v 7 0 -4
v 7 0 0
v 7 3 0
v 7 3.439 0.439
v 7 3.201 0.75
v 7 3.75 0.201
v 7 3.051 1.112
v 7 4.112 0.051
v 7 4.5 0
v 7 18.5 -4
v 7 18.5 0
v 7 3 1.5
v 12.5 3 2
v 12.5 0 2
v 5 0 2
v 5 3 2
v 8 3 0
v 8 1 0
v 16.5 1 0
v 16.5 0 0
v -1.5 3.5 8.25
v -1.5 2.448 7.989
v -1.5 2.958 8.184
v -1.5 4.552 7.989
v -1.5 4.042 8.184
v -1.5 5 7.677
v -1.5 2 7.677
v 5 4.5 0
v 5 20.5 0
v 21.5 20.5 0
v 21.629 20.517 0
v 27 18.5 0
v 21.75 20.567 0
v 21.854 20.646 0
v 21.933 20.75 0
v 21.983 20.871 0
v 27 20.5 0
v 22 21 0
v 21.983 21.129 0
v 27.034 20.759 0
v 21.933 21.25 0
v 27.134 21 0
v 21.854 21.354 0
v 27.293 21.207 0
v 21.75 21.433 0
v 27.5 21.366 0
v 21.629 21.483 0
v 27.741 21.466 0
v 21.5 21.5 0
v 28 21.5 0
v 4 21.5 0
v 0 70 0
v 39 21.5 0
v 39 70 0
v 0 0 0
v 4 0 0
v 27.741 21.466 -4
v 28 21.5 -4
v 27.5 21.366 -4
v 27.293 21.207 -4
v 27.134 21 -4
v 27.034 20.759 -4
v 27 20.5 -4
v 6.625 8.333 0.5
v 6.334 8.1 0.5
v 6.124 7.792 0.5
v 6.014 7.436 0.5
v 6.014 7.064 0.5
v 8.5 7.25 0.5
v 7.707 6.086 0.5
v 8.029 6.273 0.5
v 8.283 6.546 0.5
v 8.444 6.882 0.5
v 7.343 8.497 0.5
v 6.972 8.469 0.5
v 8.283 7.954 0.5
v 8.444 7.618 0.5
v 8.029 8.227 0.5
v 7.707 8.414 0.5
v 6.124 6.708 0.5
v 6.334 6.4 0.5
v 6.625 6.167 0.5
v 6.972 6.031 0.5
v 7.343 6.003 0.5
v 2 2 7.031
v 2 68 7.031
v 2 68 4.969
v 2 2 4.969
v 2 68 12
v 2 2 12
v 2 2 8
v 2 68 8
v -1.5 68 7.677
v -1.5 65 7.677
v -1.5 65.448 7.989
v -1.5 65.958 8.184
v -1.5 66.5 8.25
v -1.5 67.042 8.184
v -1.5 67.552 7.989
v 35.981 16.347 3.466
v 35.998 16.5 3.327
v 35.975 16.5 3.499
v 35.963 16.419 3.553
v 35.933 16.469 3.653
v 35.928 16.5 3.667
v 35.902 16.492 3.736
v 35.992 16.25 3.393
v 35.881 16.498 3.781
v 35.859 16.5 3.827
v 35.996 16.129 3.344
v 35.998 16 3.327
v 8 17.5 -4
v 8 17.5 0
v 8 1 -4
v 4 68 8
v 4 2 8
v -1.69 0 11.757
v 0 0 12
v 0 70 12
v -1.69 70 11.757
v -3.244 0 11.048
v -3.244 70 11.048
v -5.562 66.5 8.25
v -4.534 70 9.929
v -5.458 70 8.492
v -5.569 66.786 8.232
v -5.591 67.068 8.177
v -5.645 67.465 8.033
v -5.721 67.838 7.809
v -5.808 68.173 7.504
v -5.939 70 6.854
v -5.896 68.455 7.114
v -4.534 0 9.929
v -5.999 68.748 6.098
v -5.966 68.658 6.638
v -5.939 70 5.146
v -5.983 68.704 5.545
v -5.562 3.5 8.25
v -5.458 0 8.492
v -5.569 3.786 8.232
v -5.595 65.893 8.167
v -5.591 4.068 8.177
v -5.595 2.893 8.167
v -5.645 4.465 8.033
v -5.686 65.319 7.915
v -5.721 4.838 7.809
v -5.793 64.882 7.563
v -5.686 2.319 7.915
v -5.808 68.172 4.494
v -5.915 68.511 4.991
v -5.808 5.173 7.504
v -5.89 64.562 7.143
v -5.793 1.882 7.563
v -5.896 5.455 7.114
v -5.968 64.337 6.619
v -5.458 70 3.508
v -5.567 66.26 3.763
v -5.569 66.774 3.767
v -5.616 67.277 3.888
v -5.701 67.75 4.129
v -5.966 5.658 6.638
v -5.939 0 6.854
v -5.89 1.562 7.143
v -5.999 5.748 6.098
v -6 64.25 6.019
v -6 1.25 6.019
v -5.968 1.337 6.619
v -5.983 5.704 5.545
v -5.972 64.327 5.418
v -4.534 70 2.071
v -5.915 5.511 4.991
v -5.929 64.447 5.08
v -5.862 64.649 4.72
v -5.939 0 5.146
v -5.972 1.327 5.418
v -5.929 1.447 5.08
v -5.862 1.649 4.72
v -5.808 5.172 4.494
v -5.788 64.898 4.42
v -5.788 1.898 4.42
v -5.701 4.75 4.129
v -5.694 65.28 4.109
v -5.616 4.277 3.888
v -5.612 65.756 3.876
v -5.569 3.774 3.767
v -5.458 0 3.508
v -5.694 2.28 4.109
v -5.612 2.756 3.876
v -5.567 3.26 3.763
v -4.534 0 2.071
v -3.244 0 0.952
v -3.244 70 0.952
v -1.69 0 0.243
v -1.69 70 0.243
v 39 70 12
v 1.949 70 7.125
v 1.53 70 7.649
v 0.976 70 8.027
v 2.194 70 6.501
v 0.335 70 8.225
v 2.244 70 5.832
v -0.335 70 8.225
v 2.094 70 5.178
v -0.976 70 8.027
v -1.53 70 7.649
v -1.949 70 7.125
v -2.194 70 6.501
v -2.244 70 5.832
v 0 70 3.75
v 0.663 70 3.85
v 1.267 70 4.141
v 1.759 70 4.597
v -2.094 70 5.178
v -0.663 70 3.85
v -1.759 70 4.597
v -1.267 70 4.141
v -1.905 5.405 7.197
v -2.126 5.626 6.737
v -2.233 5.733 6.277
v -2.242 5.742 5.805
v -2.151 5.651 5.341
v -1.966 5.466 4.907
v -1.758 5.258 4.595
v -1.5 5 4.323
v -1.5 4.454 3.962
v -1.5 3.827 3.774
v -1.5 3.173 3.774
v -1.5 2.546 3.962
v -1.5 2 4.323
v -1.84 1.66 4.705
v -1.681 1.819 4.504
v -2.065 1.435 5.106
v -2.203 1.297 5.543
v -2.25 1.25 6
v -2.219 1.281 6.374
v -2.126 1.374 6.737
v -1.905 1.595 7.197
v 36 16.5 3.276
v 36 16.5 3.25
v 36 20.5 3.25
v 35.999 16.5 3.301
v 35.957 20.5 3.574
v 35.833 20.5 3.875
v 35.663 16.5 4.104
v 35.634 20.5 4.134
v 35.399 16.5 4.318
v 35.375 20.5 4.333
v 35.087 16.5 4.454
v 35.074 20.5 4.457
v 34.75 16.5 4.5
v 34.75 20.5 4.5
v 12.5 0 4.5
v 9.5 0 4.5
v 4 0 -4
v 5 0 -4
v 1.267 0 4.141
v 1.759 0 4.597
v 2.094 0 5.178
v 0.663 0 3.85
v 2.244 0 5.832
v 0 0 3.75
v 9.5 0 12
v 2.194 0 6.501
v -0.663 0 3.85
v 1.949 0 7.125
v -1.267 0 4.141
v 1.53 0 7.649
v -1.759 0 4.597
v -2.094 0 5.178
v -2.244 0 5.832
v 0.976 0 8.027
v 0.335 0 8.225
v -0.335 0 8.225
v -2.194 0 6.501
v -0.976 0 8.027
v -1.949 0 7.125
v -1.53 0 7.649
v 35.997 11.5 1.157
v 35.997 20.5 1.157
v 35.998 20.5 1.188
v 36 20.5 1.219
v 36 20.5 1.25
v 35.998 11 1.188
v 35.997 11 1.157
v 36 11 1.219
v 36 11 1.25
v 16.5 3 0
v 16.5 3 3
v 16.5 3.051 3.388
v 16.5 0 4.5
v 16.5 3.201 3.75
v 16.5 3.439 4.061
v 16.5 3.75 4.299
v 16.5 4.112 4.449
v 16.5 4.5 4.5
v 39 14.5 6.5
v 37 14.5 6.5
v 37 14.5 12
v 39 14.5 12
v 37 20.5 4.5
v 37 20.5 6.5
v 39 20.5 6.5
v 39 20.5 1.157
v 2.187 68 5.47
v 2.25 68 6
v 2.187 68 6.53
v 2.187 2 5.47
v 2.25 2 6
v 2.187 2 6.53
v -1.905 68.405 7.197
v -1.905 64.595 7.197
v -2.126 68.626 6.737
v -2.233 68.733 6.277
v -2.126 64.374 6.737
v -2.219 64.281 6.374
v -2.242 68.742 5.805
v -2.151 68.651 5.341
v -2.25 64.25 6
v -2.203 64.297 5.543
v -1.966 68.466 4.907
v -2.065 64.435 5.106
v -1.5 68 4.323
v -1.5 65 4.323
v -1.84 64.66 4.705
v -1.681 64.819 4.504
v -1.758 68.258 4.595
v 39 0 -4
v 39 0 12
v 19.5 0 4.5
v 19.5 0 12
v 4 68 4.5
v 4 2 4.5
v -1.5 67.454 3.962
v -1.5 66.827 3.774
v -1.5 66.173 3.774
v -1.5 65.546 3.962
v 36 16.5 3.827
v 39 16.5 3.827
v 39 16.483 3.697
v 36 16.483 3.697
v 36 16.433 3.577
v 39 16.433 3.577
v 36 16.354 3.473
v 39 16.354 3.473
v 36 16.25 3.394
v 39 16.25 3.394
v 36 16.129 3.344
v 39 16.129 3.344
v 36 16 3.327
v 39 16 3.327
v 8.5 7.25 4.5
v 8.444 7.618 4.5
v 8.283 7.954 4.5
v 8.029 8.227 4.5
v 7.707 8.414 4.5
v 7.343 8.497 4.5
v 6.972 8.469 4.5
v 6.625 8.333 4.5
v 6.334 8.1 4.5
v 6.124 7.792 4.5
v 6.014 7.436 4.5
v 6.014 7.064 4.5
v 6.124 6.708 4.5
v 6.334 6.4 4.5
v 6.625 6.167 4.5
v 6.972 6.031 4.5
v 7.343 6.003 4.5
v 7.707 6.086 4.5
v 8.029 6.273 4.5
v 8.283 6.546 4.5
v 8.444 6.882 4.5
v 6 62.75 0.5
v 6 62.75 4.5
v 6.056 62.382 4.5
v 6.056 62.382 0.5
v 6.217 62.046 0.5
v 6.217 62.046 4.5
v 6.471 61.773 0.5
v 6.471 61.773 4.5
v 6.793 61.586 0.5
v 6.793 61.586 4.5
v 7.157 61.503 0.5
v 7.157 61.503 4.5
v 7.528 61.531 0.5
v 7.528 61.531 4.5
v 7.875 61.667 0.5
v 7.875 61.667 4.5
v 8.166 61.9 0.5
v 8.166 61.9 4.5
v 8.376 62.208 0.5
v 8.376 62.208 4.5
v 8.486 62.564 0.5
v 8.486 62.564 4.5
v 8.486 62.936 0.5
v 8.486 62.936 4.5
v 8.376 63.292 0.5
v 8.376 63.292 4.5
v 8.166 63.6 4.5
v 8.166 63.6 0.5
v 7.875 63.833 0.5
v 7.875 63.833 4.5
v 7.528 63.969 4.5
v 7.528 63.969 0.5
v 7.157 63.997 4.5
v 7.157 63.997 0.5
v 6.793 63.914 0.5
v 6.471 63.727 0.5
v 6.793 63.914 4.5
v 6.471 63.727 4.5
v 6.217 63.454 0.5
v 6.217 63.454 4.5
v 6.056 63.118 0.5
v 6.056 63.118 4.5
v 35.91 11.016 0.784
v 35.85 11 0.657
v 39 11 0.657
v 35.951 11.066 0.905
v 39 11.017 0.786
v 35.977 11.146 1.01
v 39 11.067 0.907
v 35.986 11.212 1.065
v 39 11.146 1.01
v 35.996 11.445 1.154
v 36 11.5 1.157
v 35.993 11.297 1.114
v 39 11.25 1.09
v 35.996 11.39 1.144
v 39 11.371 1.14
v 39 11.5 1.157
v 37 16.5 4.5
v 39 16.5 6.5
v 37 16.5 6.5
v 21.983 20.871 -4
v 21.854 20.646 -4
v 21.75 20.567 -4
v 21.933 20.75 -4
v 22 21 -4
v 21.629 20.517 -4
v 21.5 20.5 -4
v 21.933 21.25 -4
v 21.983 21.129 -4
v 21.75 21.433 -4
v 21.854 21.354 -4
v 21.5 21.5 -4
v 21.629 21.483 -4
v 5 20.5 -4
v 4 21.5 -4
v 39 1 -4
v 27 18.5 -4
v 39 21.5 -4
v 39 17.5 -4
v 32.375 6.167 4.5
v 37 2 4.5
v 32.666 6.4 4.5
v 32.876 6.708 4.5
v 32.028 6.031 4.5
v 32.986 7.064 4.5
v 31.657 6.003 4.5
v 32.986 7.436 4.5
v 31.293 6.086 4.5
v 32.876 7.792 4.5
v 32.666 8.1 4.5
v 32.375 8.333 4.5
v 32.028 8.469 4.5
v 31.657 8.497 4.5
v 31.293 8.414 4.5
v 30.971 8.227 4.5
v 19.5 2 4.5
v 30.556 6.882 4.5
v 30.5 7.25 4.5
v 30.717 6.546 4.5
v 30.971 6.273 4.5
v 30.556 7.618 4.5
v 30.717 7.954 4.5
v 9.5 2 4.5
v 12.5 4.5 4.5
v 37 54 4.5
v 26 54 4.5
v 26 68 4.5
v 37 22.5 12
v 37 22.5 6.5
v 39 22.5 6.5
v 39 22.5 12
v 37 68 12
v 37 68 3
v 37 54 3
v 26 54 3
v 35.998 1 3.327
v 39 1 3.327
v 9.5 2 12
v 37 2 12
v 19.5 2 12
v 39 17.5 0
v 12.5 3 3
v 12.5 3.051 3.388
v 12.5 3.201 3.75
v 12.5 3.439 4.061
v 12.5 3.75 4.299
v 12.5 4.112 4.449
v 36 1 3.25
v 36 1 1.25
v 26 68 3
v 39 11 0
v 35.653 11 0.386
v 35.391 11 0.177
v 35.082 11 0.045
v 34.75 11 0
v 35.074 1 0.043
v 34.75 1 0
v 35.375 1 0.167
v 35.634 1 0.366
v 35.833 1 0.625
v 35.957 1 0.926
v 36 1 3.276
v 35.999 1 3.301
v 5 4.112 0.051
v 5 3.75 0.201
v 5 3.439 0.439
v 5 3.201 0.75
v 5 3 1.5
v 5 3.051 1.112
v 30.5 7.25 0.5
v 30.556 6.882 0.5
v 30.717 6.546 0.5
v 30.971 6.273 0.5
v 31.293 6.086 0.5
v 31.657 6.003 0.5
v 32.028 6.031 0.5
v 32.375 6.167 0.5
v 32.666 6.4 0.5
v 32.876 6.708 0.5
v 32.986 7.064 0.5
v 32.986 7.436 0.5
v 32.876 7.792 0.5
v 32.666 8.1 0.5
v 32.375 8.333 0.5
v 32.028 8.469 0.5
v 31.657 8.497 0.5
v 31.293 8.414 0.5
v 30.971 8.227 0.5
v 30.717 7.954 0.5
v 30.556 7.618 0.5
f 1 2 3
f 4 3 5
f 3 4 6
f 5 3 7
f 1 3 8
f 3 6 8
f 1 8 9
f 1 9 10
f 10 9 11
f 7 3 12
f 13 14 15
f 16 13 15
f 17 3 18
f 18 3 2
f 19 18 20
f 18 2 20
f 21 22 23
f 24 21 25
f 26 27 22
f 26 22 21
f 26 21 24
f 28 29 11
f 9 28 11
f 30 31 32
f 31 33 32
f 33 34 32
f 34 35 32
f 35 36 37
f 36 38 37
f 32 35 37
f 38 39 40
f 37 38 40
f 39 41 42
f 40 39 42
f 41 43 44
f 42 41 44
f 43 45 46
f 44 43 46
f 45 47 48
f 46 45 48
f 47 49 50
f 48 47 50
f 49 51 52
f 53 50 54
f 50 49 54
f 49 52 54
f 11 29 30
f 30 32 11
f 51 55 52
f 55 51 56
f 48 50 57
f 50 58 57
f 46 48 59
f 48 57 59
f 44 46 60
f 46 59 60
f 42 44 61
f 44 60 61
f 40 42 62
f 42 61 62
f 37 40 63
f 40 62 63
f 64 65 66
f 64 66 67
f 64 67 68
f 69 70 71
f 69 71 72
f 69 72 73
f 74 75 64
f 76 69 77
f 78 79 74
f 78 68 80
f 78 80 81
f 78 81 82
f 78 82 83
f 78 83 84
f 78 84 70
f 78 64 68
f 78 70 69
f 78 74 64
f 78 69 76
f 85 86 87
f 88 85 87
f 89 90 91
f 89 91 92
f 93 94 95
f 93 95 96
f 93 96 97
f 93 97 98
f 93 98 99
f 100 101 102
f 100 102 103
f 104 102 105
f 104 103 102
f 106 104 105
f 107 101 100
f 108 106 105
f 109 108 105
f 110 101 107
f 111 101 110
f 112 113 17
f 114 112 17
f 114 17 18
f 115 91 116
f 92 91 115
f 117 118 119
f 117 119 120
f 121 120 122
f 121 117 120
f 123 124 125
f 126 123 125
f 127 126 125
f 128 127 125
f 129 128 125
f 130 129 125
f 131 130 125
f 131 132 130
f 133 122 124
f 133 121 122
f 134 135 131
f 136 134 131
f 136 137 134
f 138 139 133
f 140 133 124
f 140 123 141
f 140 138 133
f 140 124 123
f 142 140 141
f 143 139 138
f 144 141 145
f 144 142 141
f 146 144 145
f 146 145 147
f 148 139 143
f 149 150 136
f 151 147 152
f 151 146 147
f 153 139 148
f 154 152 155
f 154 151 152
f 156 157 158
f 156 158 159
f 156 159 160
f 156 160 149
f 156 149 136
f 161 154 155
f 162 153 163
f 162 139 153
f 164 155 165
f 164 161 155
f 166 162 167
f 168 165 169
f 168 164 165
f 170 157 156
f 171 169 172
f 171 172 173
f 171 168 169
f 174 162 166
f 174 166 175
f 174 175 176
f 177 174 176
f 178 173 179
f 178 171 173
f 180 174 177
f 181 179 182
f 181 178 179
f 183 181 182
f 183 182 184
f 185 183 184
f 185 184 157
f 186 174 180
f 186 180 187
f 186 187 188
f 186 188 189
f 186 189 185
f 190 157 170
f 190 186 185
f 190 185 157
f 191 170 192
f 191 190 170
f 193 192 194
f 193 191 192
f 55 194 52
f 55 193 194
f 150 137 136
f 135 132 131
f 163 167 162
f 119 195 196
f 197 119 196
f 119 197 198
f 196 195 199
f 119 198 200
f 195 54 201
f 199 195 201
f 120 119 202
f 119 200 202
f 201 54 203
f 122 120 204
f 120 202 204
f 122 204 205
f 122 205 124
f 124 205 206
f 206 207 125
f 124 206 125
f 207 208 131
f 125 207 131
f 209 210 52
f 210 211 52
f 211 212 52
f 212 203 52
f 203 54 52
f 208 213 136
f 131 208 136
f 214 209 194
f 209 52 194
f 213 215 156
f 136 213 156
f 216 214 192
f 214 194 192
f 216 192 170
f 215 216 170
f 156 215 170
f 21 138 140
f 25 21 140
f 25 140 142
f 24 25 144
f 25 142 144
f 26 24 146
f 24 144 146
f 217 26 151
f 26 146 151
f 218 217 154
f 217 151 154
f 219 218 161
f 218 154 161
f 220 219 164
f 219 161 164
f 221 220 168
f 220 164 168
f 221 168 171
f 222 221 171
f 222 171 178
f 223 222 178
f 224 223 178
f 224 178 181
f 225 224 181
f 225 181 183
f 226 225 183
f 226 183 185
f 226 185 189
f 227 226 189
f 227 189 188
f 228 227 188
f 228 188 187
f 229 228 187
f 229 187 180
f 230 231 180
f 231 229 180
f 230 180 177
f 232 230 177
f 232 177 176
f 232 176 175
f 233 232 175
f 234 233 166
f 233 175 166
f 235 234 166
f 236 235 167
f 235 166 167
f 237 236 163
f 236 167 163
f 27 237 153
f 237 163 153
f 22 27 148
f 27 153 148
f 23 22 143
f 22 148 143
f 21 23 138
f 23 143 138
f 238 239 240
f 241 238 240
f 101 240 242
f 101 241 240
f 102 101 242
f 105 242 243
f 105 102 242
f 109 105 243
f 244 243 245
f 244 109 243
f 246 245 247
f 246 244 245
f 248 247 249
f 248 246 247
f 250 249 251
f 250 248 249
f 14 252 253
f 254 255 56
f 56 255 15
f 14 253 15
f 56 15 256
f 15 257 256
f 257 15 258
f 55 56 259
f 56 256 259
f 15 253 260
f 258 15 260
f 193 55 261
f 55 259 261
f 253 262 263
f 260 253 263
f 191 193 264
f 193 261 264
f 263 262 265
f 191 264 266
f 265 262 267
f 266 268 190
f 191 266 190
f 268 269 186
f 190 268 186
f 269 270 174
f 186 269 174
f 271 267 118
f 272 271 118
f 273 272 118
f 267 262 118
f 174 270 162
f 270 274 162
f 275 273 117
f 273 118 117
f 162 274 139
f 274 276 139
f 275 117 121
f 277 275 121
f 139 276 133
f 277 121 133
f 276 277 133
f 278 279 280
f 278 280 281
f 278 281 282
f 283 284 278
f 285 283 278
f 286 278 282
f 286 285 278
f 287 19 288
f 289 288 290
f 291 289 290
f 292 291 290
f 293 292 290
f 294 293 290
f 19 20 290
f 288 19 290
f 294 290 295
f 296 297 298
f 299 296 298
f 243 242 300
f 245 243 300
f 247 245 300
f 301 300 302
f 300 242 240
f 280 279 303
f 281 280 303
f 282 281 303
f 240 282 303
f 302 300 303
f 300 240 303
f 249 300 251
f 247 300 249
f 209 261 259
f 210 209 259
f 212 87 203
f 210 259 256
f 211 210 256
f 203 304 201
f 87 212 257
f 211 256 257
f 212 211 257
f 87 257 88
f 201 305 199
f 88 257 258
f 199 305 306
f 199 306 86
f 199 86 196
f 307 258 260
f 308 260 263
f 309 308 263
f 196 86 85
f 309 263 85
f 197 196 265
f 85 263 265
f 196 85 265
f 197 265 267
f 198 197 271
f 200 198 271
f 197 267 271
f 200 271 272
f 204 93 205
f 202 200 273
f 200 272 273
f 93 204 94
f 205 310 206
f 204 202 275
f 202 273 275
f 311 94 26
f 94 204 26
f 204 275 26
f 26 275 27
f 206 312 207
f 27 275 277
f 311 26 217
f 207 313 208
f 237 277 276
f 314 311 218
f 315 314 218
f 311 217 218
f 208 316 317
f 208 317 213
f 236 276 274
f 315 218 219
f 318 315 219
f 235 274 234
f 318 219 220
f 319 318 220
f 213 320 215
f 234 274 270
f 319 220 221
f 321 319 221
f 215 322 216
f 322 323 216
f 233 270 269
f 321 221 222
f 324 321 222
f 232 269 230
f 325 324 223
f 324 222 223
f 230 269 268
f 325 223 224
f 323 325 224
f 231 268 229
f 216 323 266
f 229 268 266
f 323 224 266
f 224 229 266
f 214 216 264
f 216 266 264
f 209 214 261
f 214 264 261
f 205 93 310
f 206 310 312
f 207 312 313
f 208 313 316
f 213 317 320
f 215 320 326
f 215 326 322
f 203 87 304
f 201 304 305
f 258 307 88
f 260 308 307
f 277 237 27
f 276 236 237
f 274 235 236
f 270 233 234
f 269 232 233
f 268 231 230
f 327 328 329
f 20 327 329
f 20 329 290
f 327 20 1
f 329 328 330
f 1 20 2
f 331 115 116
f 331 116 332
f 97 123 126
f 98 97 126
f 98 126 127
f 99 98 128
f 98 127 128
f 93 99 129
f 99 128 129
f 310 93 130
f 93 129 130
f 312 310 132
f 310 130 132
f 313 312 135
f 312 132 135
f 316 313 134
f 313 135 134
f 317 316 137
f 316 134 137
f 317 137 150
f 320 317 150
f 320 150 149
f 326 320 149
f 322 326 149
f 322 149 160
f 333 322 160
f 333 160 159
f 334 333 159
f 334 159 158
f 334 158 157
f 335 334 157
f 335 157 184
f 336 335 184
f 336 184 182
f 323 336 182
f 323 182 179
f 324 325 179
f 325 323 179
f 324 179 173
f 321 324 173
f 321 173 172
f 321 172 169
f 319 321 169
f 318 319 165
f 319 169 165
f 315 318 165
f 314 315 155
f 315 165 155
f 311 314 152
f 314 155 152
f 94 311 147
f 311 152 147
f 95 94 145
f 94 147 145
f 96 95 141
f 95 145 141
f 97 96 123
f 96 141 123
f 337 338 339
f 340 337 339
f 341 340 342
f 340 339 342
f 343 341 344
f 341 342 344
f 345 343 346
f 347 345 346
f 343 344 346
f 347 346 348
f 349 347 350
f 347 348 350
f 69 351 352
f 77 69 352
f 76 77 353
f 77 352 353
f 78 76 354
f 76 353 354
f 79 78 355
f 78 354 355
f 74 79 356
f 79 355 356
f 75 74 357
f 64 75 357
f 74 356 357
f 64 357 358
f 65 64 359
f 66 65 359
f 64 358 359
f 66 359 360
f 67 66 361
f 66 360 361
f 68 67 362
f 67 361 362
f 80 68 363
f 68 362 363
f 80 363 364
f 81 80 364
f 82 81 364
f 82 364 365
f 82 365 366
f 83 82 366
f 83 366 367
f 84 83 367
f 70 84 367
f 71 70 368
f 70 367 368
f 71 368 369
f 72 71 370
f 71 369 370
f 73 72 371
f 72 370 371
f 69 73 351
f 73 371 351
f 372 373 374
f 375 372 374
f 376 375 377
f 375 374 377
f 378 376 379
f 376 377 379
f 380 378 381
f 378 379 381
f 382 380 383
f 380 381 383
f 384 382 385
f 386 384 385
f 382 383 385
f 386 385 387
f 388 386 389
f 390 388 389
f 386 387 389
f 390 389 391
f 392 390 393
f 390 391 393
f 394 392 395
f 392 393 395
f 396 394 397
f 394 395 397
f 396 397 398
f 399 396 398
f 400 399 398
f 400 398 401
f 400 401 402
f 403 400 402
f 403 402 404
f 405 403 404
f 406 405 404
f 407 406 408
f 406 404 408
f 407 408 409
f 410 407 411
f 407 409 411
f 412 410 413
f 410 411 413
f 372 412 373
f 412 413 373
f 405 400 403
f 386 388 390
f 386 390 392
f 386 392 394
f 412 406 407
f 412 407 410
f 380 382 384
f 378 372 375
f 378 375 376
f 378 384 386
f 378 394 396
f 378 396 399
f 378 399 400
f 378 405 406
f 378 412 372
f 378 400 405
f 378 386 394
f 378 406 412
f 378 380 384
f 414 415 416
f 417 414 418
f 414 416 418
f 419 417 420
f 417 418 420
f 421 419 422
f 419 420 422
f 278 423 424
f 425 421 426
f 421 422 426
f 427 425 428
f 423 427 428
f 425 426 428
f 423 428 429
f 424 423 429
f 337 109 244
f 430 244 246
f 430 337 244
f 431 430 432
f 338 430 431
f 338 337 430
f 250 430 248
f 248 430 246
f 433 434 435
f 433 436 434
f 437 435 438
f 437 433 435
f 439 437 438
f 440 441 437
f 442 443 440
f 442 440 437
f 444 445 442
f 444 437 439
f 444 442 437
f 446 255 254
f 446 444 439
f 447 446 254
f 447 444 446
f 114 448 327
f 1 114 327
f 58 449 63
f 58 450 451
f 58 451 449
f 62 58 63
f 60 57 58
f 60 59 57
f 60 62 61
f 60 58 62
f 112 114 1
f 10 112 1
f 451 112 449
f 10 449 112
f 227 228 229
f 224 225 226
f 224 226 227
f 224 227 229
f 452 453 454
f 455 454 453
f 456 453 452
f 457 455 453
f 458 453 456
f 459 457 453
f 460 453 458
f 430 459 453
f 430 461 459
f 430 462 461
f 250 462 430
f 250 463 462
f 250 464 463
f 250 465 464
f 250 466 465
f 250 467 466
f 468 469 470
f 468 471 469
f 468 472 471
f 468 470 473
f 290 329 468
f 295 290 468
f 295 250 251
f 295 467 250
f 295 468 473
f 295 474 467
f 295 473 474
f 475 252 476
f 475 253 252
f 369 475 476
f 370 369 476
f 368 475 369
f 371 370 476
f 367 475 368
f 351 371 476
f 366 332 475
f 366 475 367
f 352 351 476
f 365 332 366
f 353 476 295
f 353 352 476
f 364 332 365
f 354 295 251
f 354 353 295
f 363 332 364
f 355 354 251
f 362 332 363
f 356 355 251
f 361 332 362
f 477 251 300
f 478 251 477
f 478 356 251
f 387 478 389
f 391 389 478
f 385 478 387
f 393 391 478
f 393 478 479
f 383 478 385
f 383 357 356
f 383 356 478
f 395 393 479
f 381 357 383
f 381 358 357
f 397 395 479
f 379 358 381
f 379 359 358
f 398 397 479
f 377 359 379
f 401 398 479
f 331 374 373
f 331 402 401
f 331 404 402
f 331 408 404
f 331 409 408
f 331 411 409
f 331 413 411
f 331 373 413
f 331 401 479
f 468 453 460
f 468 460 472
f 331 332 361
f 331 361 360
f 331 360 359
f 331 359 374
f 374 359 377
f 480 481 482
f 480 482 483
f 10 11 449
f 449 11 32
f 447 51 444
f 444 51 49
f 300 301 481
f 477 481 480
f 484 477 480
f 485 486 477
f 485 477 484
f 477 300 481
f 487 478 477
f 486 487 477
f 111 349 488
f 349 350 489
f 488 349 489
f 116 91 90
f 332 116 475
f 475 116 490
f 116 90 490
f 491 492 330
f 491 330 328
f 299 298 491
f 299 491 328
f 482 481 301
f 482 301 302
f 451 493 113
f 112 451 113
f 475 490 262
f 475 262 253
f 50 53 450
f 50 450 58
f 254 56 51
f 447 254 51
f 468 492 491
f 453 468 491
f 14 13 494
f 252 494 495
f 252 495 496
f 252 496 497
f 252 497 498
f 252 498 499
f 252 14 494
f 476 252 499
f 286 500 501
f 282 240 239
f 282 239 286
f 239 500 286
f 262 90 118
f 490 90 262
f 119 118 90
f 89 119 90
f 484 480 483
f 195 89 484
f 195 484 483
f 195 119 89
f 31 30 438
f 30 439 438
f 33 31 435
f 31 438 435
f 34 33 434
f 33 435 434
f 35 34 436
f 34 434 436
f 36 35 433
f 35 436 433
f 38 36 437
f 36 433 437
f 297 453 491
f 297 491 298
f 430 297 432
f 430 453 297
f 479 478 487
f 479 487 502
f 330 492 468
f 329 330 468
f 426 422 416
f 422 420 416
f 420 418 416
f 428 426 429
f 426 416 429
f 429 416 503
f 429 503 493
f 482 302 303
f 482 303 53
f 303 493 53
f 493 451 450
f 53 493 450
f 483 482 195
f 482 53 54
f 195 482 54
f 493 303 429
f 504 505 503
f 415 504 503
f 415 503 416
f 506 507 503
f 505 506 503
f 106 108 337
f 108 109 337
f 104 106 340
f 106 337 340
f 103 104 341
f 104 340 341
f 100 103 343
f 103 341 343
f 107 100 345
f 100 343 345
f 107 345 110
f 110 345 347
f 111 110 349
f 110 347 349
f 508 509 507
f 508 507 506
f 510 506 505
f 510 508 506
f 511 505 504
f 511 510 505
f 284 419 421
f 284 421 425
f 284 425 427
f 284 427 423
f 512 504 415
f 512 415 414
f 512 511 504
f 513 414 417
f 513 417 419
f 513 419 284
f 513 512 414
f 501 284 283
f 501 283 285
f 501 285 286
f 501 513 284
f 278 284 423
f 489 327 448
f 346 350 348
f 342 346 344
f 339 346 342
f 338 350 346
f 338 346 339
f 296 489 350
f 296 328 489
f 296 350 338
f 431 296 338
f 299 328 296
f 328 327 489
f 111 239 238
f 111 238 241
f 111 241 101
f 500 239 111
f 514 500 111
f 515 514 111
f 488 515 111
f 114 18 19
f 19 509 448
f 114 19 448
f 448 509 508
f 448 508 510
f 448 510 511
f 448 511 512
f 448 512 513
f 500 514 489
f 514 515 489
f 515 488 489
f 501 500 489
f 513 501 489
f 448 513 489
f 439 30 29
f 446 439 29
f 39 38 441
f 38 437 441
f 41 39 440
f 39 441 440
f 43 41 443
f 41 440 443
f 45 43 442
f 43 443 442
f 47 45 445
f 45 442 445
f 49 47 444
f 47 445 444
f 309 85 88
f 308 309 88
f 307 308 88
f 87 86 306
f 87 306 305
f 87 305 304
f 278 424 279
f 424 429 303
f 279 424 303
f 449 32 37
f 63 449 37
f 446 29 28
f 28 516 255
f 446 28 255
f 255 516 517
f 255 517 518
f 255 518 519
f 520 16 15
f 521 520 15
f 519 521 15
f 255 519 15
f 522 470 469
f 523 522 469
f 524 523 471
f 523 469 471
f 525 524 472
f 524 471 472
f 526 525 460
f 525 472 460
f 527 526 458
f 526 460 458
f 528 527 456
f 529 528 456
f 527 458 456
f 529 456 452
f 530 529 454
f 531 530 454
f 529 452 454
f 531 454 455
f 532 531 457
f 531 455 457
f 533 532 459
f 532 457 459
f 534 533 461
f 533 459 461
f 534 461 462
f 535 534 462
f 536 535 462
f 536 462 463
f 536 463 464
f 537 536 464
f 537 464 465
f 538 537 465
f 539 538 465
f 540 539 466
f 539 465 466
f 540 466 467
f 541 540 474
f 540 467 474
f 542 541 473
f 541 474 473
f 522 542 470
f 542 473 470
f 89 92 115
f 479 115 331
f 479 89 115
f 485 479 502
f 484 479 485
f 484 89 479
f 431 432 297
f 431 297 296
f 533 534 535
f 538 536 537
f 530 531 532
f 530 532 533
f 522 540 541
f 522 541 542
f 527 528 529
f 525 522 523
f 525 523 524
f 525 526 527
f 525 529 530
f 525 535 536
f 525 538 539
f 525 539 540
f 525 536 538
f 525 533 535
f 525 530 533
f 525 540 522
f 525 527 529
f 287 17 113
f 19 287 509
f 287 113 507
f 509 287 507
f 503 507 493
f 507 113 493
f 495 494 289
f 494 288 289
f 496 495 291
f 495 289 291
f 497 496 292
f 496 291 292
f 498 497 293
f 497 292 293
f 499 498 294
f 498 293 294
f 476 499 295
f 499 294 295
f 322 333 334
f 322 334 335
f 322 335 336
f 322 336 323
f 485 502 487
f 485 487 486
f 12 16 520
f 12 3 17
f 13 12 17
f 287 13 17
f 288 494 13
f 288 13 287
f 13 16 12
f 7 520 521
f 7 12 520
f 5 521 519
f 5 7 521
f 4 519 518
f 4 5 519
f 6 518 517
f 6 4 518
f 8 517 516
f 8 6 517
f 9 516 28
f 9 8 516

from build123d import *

# Parameters (mm, degrees)
SKETCH1_W                = 39
SKETCH1_H                = 70
BASE_DEPTH               = 4.5
SKETCH2_W                = 4
SKETCH2_H                = 62
WALLS_DEPTH              = 7.5
SKETCH3_W                = 10
SKETCH3_H                = 7.5
PWR_CONNECTOR_HOLE_DEPTH = 4
SKETCH4_W                = 7.5
SKETCH4_H                = 8
GPS_CONNECTOR_HOLE_DEPTH = 4
SKETCH5_R                = 1.25
MOUNTING_HOLES_DEPTH     = 4
GPS_MOUNT_DEPTH          = 4
SKETCH11_W               = 17
SKETCH11_H               = 1
SKETCH11_W_2             = 12
SKETCH11_H_2             = 3
PWR_CABLE_HOLDER1_DEPTH  = 4
SKETCH12_W               = 4
SKETCH12_H               = 2.5
PWR_CABLE_HOLDER2_DEPTH  = 3
PWR_FILLET_R             = 1.5
PWR_FILLET2_R            = 1
PWR_FILLET3_R            = 0.5
GPS_CABLE_HOLDER_DEPTH   = 3
GPS_START                = 1
GPS_FILLET_DEPTH         = 10
GPS_START_2              = 16.5
GPS_FILLET_2_DEPTH       = 4
GPS_START_3              = 9.15727
GPS_FILLET_3_DEPTH       = 8.34273
GPS_FILLET_2_2_R         = 0.5
SKETCH15_R               = 6
BALLON_MOUNT_DEPTH       = 70
SKETCH16_R               = 2.25
BALLOON_MOUNT_HOLE_DEPTH = 70
SKETCH21_R               = 2.25
SAFETY_MOUNT_DEPTH       = 4.5
SKETCH22_W               = 35
SKETCH22_H               = 66
LID_HOLE_DEPTH           = 7.5
SKETCH25_W               = 3.5
SKETCH25_H               = 66
CORRECTION_DEPTH         = 2
SKETCH28_W               = 2
SKETCH28_H               = 2
SMALLER_WALLS_DEPTH      = 2
SKETCH29_W               = 11
SKETCH29_H               = 14
ANTENNA_SPACE_DEPTH      = 1.5


with BuildPart() as part:
    # Sketch1 → Base (new body)
    with BuildSketch(Plane.XY):
        with Locations((19.5, 35)):
            Rectangle(SKETCH1_W, SKETCH1_H)
    extrude(amount=BASE_DEPTH)

    # Sketch2 → Walls (add)
    with BuildSketch(Plane.XY.offset(4.5)):
        Polygon((39, 66), (39, 70), (0, 70), (0, 66), (4, 66), (35, 66), align=None)
        with Locations((37, 35)):
            Rectangle(SKETCH2_W, SKETCH2_H)
        Polygon((4, 66), (0, 66), (0, 0), (4, 0), (4, 4), align=None)
        Polygon((39, 0), (39, 4), (35, 4), (4, 4), (4, 0), align=None)
    extrude(amount=WALLS_DEPTH)

    # Sketch3 → PWR connector hole (cut)
    with BuildSketch(Plane(origin=(0, 4, 0), x_dir=(1, 0, 0), z_dir=(0, 1, 0))):
        with Locations((14.5, -8.25)):
            Rectangle(SKETCH3_W, SKETCH3_H)
    extrude(amount=-PWR_CONNECTOR_HOLE_DEPTH, mode=Mode.SUBTRACT)

    # Sketch4 → GPS connector hole (cut)
    with BuildSketch(Plane.ZY.offset(-35)):
        with Locations((8.25, 18.5)):
            Rectangle(SKETCH4_W, SKETCH4_H)
    extrude(amount=-GPS_CONNECTOR_HOLE_DEPTH, mode=Mode.SUBTRACT)

    # Sketch5 → Mounting holes (cut)
    with BuildSketch(Plane.XY.offset(4.5)):
        with Locations((7.25, 7.25)):
            Circle(SKETCH5_R)
        with Locations(Location((31.75, 7.25, 0), (0, 0, 180))):
            Circle(SKETCH5_R)
        with Locations(Location((7.25, 62.75, 0), (0, 0, 180))):
            Circle(SKETCH5_R)
    extrude(amount=-MOUNTING_HOLES_DEPTH, mode=Mode.SUBTRACT)

    # Sketch7 → GPS mount (add)
    with BuildSketch(Plane(origin=(0, 0, 0), x_dir=(-1, 0, 0), z_dir=(0, 0, -1))):
        Polygon((-39, 1), (-39, 0), (-7, 0), (-7, 18.5), (-39, 18.5), (-39, 17.5), (-8, 17.5), (-8, 1), align=None)
    extrude(amount=GPS_MOUNT_DEPTH)

    # Sketch11 → PWR cable holder1 (add)
    with BuildSketch(Plane(origin=(0, 0, 0), x_dir=(-1, 0, 0), z_dir=(0, 0, -1))):
        Polygon((-5, 0), (-4, 0), (-4, 21.5), (-5, 21.5), (-5, 20.5), align=None)
        with Locations((-13.5, 21)):
            Rectangle(SKETCH11_W, SKETCH11_H)
        with Locations((-33, 20)):
            Rectangle(SKETCH11_W_2, SKETCH11_H_2)
    extrude(amount=PWR_CABLE_HOLDER1_DEPTH)

    # Sketch12 → PWR cable holder2 (cut)
    with BuildSketch(Plane.XZ):
        Polygon((5, 2), (5, 0), (7, 0), (16.5, 0), (16.5, 2), (12.5, 2), align=None)
        with Locations((14.5, 3.25)):
            Rectangle(SKETCH12_W, SKETCH12_H)
    extrude(amount=-PWR_CABLE_HOLDER2_DEPTH, mode=Mode.SUBTRACT)

    # PWR fillet
    pwr_fillet_edges = [part.edges().sort_by_distance(p)[0] for p in [
        (6, 3, 0),
        (14.5, 3, 4.5),
    ]]
    fillet(pwr_fillet_edges, radius=PWR_FILLET_R)

    # PWR fillet2
    pwr_fillet2_edges = [part.edges().sort_by_distance(p)[0] for p in [
        (27, 21.5, -2),
    ]]
    fillet(pwr_fillet2_edges, radius=PWR_FILLET2_R)

    # PWR fillet3
    pwr_fillet3_edges = [part.edges().sort_by_distance(p)[0] for p in [
        (22, 21.5, -2),
        (22, 20.5, -2),
    ]]
    fillet(pwr_fillet3_edges, radius=PWR_FILLET3_R - 0.0001)  # a hair under: the kernel refuses the full size

    # Sketch13 → GPS cable holder (cut)
    with BuildSketch(Plane(origin=(39, 0, 0), x_dir=(0, 0, -1), z_dir=(1, 0, 0))):
        Polygon((-1.156586719, 11), (-2.326586719, 11), (-2.326586719, 1), (0, 1), (0, 11), align=None)
        Polygon((-2.326586719, 11), (-2.326586719, 16.5), (-3.326586719, 16.5), (-3.326586719, 1), (-2.326586719, 1), align=None)
        Polygon((-1.156586719, 20.5), (-2.326586719, 20.5), (-2.326586719, 16.5), (-2.326586719, 11), (-1.156586719, 11), align=None)
        Polygon((-2.326586719, 20.5), (-4.5, 20.5), (-4.5, 16.5), (-3.326586719, 16.5), (-2.326586719, 16.5), align=None)
    extrude(amount=-GPS_CABLE_HOLDER_DEPTH, mode=Mode.SUBTRACT)

    # GPS fillet: read off the stored shape, not the designer's step
    # GPS fillet outline → GPS fillet (cut)
    with BuildSketch(Plane(origin=(0, 0, 0), x_dir=(1, 0, 0), z_dir=(0, 1, 0)).offset(GPS_START)):
        with BuildLine():
            Line((36, -3.326586719), (36, -3.25))
            ThreePointArc((36, -3.25), (35.999412758, -3.288311358), (35.997651584, -3.326586719))
            Line((35.997651584, -3.326586719), (36, -3.326586719))
        make_face()
        with BuildLine():
            Line((36, -1.25), (36, 0))
            Line((36, 0), (34.75, 0))
            ThreePointArc((34.75, 0), (35.633883476, -0.366116524), (36, -1.25))
        make_face()
    extrude(amount=GPS_FILLET_DEPTH, mode=Mode.SUBTRACT)

    # GPS fillet 2 outline → GPS fillet 2 (cut)
    with BuildSketch(Plane(origin=(0, 0, 0), x_dir=(1, 0, 0), z_dir=(0, 1, 0)).offset(GPS_START_2)):
        with BuildLine():
            ThreePointArc((36, -3.25), (35.633883476, -4.133883476), (34.75, -4.5))
            Line((34.75, -4.5), (36, -4.5))
            Line((36, -4.5), (36, -3.25))
        make_face()
        with BuildLine():
            ThreePointArc((35.996504697, -1.156586719), (35.999125868, -1.203260674), (36, -1.25))
            Line((36, -1.25), (36, -1.156586719))
            Line((36, -1.156586719), (35.996504697, -1.156586719))
        make_face()
    extrude(amount=GPS_FILLET_2_DEPTH, mode=Mode.SUBTRACT)

    # GPS fillet 3 outline → GPS fillet 3 (cut)
    with BuildSketch(Plane(origin=(0, 0, 0), x_dir=(1, 0, 0), z_dir=(0, 1, 0)).offset(GPS_START_3)):
        with BuildLine():
            Line((36, -3.326586719), (36, -3.25))
            ThreePointArc((36, -3.25), (35.999412758, -3.288311358), (35.997651584, -3.326586719))
            Line((35.997651584, -3.326586719), (36, -3.326586719))
        make_face()
        with BuildLine():
            ThreePointArc((35.996504697, -1.156586719), (35.999125868, -1.203260674), (36, -1.25))
            Line((36, -1.25), (36, -1.156586719))
            Line((36, -1.156586719), (35.996504697, -1.156586719))
        make_face()
    extrude(amount=GPS_FILLET_3_DEPTH, mode=Mode.SUBTRACT)

    # GPS fillet 2 2
    # the kernel refuses this fillet: 0.5 mm, written as the material it takes off along each edge
    with BuildSketch(Plane(origin=(40.25, 11, 1.156586719), x_dir=(0, 0, -1), z_dir=(-1, 0, 0))) as gps_fillet_2_2_piece_1:
        with BuildLine():
            CenterArc((GPS_FILLET_2_2_R, -GPS_FILLET_2_2_R), GPS_FILLET_2_2_R, 90, 90)
            Line((0, -GPS_FILLET_2_2_R), (0, 0))
            Line((0, 0), (GPS_FILLET_2_2_R, 0))
        make_face()
    extrude(amount=4.25, mode=Mode.SUBTRACT)
    with BuildSketch(Plane(origin=(40.25, 16.5, 3.326586719), x_dir=(0, -1, 0), z_dir=(-1, 0, 0))) as gps_fillet_2_2_piece_2:
        with BuildLine():
            CenterArc((GPS_FILLET_2_2_R, GPS_FILLET_2_2_R), GPS_FILLET_2_2_R, 180, 90)
            Line((0, GPS_FILLET_2_2_R), (0, 0))
            Line((0, 0), (GPS_FILLET_2_2_R, 0))
        make_face()
    extrude(amount=4.25, mode=Mode.SUBTRACT)
    with BuildSketch(Plane(origin=(36, 16.5, 3.326586719), x_dir=(0, -1.0, 5.126796764898245e-10), z_dir=(-1, 0, 0))) as gps_fillet_2_2_piece_3_section:
        with BuildLine():
            CenterArc((GPS_FILLET_2_2_R, GPS_FILLET_2_2_R), GPS_FILLET_2_2_R, 179.999999971, 90)
            Line((GPS_FILLET_2_2_R * 5.12679676753e-10, GPS_FILLET_2_2_R), (0, 0))
            Line((0, 0), (GPS_FILLET_2_2_R, 0))
        make_face()
    gps_fillet_2_2_piece_3 = extrude(amount=1.252348417, mode=Mode.PRIVATE)
    gps_fillet_2_2_piece_3 = gps_fillet_2_2_piece_3 - Plane(origin=(34.749999755, 16.5, 3.249999996), x_dir=(1.0, 0, 2.949740140725451e-09), z_dir=(0, -1, 0)) * Cylinder(1.250000245, 5, mode=Mode.PRIVATE)
    add(gps_fillet_2_2_piece_3, mode=Mode.SUBTRACT)
    with BuildSketch(Plane(origin=(34.746504697, 11, 1.156586719), x_dir=(0, 0, -1), z_dir=(1, 0, 0))) as gps_fillet_2_2_piece_4_section:
        with BuildLine():
            CenterArc((GPS_FILLET_2_2_R, GPS_FILLET_2_2_R), GPS_FILLET_2_2_R, 180, 90)
            Line((-GPS_FILLET_2_2_R * 5.12674791509e-10, GPS_FILLET_2_2_R), (0, 0))
            Line((0, 0), (GPS_FILLET_2_2_R, 0))
        make_face()
    gps_fillet_2_2_piece_4 = extrude(amount=1.253495303, mode=Mode.PRIVATE)
    gps_fillet_2_2_piece_4 = gps_fillet_2_2_piece_4 - Plane(origin=(34.749999998, 11, 1.250000002), x_dir=(1.3197563913171698e-09, 0, -1.0), z_dir=(0, -1, 0)) * Cylinder(1.250000002, 5, mode=Mode.PRIVATE)
    add(gps_fillet_2_2_piece_4, mode=Mode.SUBTRACT)

    # Sketch15 → Ballon mount (add)
    with BuildSketch(Plane.XZ):
        with Locations((0, 6)):
            Circle(SKETCH15_R)
    extrude(amount=-BALLON_MOUNT_DEPTH)

    # Sketch16 → Balloon mount hole (cut)
    with BuildSketch(Plane.XZ):
        with Locations(Location((0, 6, 0), (0, 0, 270))):
            Circle(SKETCH16_R)
    extrude(amount=-BALLOON_MOUNT_HOLE_DEPTH, mode=Mode.SUBTRACT)

    # Sketch21 → Safety mount (cut)
    with BuildSketch(Plane.ZY.offset(6)):
        with Locations((6, 3.5)):
            Circle(SKETCH21_R)
        with Locations((6, 66.5)):
            Circle(SKETCH21_R)
    extrude(amount=-SAFETY_MOUNT_DEPTH, mode=Mode.SUBTRACT)

    # Sketch22 → Lid hole (cut)
    with BuildSketch(Plane.XY.offset(12)):
        with Locations((19.5, 35)):
            Rectangle(SKETCH22_W, SKETCH22_H)
    extrude(amount=-LID_HOLE_DEPTH, mode=Mode.SUBTRACT)

    # Sketch25 → Correction (add)
    with BuildSketch(Plane(origin=(2, 0, 0), x_dir=(0, 0, -1), z_dir=(1, 0, 0))):
        with Locations((-6.25, 35)):
            Rectangle(SKETCH25_W, SKETCH25_H)
    extrude(amount=CORRECTION_DEPTH)

    # Sketch28 → Smaller walls (add)
    with BuildSketch(Plane.XY.offset(4.5)):
        with Locations((38, 21.5)):
            Rectangle(SKETCH28_W, SKETCH28_H)
        with Locations((38, 15.5)):
            Rectangle(SKETCH28_W, SKETCH28_H)
    extrude(amount=SMALLER_WALLS_DEPTH)

    # Sketch29 → Antenna space (cut)
    with BuildSketch(Plane.XY.offset(4.5)):
        with Locations((31.5, 61)):
            Rectangle(SKETCH29_W, SKETCH29_H)
    extrude(amount=-ANTENNA_SPACE_DEPTH, mode=Mode.SUBTRACT)


solid = part.part
